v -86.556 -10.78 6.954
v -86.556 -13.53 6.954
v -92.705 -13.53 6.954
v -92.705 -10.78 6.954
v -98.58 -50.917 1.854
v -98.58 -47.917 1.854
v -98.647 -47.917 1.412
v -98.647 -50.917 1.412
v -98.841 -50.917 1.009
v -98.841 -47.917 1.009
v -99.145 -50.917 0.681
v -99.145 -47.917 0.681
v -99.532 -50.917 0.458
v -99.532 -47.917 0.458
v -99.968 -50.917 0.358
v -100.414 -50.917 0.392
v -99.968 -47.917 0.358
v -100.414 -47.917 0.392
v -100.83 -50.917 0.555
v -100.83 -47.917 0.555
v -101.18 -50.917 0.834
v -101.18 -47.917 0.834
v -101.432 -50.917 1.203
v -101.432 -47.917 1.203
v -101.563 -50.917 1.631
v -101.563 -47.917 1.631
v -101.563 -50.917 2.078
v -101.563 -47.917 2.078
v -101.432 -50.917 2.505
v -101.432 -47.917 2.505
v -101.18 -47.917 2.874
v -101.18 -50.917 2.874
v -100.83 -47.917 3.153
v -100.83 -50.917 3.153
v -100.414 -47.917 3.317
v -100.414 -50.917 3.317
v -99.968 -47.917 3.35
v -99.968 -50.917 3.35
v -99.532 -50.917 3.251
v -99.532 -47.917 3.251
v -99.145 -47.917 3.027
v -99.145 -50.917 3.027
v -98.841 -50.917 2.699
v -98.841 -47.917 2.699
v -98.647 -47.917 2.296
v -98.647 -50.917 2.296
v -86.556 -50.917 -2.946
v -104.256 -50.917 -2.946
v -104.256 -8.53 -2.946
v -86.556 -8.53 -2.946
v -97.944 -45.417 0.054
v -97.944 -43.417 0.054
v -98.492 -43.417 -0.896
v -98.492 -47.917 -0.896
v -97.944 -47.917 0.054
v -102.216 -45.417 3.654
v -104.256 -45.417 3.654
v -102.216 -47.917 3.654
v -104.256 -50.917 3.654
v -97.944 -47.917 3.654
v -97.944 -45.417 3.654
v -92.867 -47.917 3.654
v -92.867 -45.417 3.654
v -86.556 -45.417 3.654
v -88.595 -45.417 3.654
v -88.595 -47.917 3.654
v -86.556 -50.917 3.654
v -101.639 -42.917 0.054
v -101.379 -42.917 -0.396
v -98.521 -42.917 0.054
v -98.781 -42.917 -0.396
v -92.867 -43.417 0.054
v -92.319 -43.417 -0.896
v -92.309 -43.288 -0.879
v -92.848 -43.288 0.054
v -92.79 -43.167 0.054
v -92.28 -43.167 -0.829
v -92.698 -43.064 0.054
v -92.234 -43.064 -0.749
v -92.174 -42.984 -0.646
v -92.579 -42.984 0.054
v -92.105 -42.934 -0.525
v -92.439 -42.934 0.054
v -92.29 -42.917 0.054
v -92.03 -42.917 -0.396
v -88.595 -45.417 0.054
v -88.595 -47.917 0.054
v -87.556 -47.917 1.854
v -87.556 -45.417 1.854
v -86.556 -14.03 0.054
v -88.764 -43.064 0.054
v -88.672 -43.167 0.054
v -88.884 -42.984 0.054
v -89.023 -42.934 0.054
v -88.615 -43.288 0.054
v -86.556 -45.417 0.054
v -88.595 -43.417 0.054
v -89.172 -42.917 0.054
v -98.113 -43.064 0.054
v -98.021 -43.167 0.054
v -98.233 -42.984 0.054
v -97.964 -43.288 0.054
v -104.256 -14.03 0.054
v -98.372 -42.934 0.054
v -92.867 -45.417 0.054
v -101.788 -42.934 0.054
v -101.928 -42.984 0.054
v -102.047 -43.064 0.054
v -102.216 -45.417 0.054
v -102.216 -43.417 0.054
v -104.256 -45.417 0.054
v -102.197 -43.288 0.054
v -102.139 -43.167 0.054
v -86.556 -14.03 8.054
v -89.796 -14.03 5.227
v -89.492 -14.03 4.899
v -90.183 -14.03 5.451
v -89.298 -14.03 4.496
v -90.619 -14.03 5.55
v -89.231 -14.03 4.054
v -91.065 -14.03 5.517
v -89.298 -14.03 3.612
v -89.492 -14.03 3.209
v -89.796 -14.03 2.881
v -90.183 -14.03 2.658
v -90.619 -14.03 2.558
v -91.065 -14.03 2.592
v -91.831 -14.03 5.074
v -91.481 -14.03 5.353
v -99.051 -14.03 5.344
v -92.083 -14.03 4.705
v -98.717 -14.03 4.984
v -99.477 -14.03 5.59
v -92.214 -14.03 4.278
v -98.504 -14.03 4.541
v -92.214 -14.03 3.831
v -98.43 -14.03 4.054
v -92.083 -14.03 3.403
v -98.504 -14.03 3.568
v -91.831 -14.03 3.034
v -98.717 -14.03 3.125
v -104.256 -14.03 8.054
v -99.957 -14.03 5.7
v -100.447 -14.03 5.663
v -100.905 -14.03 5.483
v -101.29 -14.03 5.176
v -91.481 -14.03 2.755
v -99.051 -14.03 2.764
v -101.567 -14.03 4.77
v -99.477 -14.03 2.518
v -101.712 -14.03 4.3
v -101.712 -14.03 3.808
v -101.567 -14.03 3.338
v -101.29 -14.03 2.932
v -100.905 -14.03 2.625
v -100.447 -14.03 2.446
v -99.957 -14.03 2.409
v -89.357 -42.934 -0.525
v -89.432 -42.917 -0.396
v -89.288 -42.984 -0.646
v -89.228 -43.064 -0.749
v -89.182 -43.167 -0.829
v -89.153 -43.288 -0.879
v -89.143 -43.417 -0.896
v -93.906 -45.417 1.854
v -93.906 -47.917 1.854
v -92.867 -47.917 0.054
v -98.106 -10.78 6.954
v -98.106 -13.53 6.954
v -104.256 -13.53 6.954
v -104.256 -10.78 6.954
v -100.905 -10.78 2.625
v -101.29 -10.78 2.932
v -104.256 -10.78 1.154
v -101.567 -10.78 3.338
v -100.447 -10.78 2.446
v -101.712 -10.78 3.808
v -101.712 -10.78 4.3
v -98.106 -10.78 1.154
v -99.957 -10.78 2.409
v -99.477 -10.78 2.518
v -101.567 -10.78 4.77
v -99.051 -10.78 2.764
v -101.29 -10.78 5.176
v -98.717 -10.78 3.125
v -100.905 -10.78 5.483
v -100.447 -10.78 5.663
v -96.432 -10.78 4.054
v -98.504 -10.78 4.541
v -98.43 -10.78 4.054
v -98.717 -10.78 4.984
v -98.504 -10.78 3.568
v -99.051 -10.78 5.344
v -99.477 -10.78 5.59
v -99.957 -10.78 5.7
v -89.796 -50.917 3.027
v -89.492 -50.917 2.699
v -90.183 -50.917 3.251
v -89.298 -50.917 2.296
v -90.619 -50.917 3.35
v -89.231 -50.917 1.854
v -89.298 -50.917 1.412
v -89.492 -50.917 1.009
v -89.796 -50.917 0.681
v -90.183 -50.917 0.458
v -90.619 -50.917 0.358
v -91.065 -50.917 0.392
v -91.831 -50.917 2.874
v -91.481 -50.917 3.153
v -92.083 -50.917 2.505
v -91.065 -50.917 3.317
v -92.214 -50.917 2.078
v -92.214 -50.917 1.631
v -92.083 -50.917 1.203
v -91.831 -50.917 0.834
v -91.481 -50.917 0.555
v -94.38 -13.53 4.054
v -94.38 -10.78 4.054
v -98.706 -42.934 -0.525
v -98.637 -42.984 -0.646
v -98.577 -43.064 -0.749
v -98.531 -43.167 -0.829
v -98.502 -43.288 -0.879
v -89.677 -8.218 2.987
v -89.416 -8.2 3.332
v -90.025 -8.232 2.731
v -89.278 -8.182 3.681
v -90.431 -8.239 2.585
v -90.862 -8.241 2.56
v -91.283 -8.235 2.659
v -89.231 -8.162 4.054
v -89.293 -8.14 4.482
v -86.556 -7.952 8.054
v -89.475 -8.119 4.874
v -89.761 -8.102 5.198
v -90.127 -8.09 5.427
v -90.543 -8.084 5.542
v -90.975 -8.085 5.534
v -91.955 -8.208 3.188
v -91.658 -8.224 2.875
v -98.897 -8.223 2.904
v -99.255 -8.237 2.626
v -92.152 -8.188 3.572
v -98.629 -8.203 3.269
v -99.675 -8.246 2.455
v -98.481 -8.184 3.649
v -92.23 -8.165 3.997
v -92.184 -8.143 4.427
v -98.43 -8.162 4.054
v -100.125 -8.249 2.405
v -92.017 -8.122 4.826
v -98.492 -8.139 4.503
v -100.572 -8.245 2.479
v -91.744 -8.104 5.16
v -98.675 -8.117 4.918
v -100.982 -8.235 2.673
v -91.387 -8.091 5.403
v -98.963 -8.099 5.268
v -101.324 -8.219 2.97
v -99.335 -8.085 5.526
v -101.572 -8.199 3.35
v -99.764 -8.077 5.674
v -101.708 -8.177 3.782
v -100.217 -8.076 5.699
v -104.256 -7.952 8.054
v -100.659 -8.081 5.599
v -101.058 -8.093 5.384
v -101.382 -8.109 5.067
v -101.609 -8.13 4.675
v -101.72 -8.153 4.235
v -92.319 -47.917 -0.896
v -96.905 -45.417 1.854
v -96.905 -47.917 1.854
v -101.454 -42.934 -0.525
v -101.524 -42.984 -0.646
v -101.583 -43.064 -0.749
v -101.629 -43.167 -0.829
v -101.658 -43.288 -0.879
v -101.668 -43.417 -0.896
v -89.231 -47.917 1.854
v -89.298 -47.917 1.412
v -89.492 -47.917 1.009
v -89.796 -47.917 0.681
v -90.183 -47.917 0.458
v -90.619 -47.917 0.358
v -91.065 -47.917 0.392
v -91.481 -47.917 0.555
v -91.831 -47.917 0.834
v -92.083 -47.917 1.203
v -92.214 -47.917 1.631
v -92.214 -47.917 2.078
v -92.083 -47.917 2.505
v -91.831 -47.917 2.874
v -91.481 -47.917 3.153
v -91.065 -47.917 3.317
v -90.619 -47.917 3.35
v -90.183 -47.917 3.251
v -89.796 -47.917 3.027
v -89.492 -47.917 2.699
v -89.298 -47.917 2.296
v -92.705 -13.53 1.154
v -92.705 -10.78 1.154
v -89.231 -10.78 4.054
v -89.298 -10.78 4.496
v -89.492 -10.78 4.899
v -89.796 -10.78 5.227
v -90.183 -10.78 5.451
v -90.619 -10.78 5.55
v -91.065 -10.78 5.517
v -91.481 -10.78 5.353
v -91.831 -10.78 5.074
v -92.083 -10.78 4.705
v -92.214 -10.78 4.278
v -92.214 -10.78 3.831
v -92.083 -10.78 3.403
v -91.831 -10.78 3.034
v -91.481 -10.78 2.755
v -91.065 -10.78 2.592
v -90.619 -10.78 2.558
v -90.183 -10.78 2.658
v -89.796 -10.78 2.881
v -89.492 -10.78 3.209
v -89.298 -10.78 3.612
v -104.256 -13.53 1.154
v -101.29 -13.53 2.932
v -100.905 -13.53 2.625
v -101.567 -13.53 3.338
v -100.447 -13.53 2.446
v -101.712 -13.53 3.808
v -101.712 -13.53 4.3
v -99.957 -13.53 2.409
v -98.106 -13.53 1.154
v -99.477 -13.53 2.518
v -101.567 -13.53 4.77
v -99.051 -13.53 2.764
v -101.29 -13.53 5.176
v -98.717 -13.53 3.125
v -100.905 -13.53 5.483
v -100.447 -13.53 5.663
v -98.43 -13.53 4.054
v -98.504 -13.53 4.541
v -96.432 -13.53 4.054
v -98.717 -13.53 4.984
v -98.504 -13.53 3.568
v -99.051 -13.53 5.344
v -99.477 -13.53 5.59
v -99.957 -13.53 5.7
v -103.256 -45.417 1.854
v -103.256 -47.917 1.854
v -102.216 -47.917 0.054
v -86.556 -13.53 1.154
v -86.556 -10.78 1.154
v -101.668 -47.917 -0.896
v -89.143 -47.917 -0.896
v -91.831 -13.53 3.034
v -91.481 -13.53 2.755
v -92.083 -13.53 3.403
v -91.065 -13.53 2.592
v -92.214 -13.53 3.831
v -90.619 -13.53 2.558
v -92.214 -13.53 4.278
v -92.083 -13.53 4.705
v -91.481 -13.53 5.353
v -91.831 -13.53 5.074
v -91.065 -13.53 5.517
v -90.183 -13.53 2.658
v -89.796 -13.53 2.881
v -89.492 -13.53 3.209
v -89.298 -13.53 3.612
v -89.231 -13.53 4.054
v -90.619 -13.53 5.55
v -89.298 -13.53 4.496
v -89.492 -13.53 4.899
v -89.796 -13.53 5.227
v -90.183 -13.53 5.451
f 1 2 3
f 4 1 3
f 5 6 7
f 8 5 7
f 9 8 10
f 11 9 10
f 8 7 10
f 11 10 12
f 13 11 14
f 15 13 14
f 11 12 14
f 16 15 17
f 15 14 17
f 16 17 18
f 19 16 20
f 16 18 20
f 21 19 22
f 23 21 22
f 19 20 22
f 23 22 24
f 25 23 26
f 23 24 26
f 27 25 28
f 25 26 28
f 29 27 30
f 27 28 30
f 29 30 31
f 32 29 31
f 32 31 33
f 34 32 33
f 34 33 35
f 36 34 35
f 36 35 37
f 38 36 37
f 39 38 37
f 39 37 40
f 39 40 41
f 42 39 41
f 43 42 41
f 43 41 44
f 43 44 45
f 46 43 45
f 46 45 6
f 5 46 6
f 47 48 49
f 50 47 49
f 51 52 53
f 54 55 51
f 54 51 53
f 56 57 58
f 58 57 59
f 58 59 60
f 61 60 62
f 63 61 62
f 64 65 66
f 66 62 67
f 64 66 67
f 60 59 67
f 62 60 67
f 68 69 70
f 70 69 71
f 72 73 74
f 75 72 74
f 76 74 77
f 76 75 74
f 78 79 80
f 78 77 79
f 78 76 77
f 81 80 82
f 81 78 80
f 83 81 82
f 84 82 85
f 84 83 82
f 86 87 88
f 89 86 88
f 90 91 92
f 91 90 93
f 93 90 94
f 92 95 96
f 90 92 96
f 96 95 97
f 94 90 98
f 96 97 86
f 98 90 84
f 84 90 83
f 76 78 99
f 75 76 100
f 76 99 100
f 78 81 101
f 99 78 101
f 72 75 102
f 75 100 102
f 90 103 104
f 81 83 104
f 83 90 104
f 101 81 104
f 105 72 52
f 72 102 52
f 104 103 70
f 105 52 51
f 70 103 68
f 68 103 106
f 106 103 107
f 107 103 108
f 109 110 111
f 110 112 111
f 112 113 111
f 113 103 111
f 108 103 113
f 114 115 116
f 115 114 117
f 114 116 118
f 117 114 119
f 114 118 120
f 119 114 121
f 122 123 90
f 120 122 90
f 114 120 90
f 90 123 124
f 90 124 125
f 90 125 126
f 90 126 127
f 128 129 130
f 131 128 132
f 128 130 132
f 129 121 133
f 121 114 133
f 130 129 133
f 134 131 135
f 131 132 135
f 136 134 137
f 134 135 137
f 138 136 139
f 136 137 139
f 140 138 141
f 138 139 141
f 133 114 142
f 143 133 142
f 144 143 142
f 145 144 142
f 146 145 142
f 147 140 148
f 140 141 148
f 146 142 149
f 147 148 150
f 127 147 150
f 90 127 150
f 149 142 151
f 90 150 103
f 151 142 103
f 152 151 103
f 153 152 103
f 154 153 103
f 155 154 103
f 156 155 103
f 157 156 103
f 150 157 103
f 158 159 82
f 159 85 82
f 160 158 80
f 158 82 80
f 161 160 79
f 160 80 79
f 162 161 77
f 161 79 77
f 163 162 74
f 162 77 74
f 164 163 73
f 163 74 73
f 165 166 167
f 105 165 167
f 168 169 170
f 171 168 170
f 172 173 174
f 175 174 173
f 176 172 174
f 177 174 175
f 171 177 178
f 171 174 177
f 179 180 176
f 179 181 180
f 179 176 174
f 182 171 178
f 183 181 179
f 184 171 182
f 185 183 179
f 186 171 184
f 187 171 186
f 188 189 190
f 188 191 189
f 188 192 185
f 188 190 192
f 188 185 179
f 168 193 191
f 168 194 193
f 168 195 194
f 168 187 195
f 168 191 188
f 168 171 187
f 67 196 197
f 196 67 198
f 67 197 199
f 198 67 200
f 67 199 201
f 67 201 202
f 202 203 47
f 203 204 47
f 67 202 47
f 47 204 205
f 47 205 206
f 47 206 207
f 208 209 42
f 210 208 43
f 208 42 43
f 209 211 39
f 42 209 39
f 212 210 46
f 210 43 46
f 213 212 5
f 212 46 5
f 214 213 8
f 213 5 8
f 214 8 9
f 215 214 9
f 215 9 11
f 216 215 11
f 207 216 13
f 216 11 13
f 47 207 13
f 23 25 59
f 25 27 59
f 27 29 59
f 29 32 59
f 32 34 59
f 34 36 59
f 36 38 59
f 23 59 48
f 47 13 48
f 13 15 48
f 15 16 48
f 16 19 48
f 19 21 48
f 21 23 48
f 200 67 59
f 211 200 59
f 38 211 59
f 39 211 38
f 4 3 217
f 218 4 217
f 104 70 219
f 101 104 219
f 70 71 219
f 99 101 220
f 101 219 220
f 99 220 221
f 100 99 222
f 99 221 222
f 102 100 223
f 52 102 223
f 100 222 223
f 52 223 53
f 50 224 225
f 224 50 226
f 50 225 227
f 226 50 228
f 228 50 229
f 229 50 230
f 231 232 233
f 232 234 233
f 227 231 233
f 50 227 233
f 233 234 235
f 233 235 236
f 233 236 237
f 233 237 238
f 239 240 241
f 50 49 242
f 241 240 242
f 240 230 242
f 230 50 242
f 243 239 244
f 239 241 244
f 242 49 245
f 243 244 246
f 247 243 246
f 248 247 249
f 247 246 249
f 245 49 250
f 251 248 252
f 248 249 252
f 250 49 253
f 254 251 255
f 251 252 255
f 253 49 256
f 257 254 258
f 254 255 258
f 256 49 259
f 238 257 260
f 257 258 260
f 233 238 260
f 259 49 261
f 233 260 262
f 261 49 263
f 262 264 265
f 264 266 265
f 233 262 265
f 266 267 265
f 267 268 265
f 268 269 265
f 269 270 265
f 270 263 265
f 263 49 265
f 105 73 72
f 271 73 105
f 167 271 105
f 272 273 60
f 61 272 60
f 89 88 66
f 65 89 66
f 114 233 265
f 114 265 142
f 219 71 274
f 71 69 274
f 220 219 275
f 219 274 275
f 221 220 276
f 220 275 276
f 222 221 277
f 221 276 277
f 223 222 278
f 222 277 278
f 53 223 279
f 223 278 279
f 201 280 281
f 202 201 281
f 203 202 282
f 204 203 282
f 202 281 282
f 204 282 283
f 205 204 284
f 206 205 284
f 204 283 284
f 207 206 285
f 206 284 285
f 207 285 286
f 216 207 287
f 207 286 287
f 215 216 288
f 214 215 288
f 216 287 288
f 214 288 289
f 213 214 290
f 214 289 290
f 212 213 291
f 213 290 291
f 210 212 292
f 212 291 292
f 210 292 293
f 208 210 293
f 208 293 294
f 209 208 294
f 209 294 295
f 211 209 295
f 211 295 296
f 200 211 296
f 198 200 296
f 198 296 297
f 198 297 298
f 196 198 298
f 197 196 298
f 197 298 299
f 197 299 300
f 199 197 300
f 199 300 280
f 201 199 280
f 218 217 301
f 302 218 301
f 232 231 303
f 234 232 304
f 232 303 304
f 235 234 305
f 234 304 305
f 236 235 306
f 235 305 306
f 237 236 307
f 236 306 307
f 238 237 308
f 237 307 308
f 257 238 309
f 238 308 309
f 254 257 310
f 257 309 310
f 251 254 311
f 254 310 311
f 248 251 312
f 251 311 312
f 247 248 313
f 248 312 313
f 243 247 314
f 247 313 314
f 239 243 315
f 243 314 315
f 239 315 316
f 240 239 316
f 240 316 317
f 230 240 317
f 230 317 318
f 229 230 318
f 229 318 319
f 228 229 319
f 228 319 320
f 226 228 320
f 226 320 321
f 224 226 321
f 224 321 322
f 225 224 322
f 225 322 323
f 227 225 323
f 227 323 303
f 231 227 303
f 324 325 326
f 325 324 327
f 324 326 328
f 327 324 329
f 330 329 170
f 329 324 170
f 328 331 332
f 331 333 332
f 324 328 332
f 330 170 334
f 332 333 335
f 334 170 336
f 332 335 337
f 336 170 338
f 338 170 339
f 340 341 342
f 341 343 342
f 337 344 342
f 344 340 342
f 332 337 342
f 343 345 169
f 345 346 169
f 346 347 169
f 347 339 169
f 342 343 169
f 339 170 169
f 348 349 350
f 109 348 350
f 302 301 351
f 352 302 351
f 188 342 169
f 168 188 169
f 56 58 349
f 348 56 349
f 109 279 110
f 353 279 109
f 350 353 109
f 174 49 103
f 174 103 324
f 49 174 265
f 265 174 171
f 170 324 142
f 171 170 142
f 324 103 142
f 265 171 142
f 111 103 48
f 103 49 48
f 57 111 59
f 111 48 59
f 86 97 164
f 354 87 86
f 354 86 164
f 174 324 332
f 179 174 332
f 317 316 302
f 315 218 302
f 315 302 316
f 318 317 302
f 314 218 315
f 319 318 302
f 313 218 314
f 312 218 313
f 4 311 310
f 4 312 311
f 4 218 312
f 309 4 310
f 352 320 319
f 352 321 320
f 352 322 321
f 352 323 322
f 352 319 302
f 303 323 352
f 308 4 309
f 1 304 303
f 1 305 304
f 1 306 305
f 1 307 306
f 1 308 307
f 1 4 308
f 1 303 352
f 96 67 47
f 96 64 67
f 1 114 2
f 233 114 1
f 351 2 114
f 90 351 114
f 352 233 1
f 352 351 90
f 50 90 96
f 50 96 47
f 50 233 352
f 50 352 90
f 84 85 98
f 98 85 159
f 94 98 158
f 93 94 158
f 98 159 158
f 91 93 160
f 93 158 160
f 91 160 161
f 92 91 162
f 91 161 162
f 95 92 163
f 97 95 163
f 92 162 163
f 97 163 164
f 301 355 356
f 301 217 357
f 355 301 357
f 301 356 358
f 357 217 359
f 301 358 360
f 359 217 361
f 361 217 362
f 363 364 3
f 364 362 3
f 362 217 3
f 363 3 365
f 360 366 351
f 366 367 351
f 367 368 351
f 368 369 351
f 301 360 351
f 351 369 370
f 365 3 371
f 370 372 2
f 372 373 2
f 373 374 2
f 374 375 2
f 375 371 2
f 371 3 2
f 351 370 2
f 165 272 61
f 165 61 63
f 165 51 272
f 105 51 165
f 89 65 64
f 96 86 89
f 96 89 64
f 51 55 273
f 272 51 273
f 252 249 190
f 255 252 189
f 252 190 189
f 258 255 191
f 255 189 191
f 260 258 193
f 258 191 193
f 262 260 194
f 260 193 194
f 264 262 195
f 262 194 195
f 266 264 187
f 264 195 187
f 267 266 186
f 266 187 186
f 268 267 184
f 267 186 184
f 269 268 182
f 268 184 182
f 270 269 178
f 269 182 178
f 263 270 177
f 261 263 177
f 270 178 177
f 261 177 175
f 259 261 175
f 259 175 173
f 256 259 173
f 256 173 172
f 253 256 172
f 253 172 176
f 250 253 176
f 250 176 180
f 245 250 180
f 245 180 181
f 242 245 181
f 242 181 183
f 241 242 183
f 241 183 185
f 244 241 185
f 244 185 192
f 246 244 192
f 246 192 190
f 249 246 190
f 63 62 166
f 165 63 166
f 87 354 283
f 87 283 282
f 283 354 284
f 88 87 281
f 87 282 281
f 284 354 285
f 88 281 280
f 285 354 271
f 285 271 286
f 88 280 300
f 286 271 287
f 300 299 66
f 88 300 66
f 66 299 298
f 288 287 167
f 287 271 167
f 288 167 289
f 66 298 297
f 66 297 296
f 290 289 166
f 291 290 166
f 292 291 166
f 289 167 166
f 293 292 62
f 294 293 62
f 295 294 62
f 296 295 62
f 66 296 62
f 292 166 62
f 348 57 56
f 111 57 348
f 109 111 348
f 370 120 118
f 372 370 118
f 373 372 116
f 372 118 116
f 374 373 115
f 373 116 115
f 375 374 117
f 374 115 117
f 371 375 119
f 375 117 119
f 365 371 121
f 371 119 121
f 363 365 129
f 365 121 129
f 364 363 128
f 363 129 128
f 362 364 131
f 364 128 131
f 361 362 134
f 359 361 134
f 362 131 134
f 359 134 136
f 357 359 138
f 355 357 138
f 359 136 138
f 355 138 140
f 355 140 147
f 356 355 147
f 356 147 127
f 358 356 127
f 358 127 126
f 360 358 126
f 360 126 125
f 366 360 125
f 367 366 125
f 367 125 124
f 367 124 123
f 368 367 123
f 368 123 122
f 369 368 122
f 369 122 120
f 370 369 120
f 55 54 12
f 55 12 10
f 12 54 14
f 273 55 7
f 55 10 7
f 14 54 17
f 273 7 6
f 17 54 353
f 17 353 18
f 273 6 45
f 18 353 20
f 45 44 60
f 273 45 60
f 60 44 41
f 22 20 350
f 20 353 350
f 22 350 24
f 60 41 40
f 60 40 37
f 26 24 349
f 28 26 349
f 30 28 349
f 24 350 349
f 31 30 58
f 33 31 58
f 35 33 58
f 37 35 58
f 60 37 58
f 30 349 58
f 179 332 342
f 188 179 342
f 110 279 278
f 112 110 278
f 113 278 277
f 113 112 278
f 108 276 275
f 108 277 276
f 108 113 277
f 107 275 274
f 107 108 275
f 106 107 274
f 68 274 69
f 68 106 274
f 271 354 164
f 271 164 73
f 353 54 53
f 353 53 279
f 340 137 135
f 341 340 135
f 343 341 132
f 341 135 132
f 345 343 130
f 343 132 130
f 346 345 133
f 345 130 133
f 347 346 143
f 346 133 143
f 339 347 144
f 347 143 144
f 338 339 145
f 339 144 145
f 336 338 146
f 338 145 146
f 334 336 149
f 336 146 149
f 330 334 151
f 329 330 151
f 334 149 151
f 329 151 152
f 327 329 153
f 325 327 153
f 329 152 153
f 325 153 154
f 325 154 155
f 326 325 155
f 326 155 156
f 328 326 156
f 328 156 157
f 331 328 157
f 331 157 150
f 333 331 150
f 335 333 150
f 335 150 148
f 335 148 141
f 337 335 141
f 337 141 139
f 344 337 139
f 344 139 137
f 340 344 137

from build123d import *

# Parameters (mm, degrees)
BOSS_EXTRUDE1_START = -0.4
BOSS_EXTRUDE1_DEPTH = 17.7
CUT_EXTRUDE1_REACH  = 5
SKETCH3_R           = 1.5
BOSS_EXTRUDE2_DEPTH = 2.5
SKETCH3_3_R         = 1.5
CUT_EXTRUDE2_DEPTH  = 5
FILLET2_R           = 0.5
SKETCH4_R           = 1.5
SKETCH4_R_2         = 1.65
CUT_EXTRUDE3_DEPTH  = 7.077263094
CUT_EXTRUDE4_START  = -0.5
SKETCH5_R           = 1.65
SKETCH5_R_2         = 1.5
CUT_EXTRUDE4_DEPTH  = 2.75


with BuildPart() as part:
    # Sketch2 → Boss-Extrude1 (new body)
    with BuildSketch(Plane.ZY.offset(104.655623537).offset(BOSS_EXTRUDE1_START)):
        Polygon((3.654210553, -50.917330539), (-2.945789447, -50.917330539), (-2.945789447, -8.529639022), (8.054210553, -7.952375928), (8.054210553, -14.029639022), (0.054210553, -14.029639022), (0.054210553, -47.917330539), (3.654210553, -47.917330539), align=None)
    extrude(amount=-BOSS_EXTRUDE1_DEPTH)

    # Sketch3 → Cut-Extrude1 (cut, up to next)
    with BuildSketch(Plane(origin=(0, -47.917330539, 0), x_dir=(1, 0, 0), z_dir=(0, 1, 0)), mode=Mode.PRIVATE) as cut_extrude1_sk1:
        with Locations((-90.731050017, -1.854210553)):
            Circle(SKETCH3_R)
    cut_extrude1_tool1 = extrude(cut_extrude1_sk1.sketch, amount=-CUT_EXTRUDE1_REACH, mode=Mode.PRIVATE) & part.part
    add(cut_extrude1_tool1.solids().sort_by_distance((-90.73105, -47.917331, 1.854211))[0], mode=Mode.SUBTRACT)
    # Sketch3 → Cut-Extrude1 (cut, up to next)
    with BuildSketch(Plane(origin=(0, -47.917330539, 0), x_dir=(1, 0, 0), z_dir=(0, 1, 0)), mode=Mode.PRIVATE) as cut_extrude1_sk2:
        with Locations((-100.080197056, -1.854210553)):
            Circle(SKETCH3_R)
    cut_extrude1_tool2 = extrude(cut_extrude1_sk2.sketch, amount=-CUT_EXTRUDE1_REACH, mode=Mode.PRIVATE) & part.part
    add(cut_extrude1_tool2.solids().sort_by_distance((-100.080197, -47.917331, 1.854211))[0], mode=Mode.SUBTRACT)

    # Sketch3_4 → Boss-Extrude2 (add)
    with BuildSketch(Plane(origin=(0, -47.917330539, 0), x_dir=(1, 0, 0), z_dir=(0, 1, 0))):
        Polygon((-102.216393052, -3.654210553), (-103.255623537, -1.854210553), (-102.216393052, -0.054210553), (-104.255623537, -0.054210553), (-104.255623537, -3.654210553), align=None)
        Polygon((-96.904770576, -1.854210553), (-97.94400106, -3.654210553), (-92.867246013, -3.654210553), (-93.906476498, -1.854210553), (-92.867246013, -0.054210553), (-97.94400106, -0.054210553), align=None)
        Polygon((-87.555623537, -1.854210553), (-88.594854021, -3.654210553), (-86.555623537, -3.654210553), (-86.555623537, -0.054210553), (-88.594854021, -0.054210553), align=None)
    extrude(amount=BOSS_EXTRUDE2_DEPTH)

    # Sketch3_3 → Cut-Extrude2 (cut)
    with BuildSketch(Plane(origin=(0, -47.917330539, 0), x_dir=(1, 0, 0), z_dir=(0, 1, 0))):
        Polygon((-103.255623537, -1.854210553), (-101.667910296, -4.604210553), (-98.492483816, -4.604210553), (-96.904770576, -1.854210553), (-98.492483816, 0.895789447), (-101.667910296, 0.895789447), align=None)
        with Locations((-100.080197056, -1.854210553)):
            Circle(SKETCH3_3_R, mode=Mode.SUBTRACT)
        Polygon((-87.555623537, -1.854210553), (-89.143336777, 0.895789447), (-92.318763257, 0.895789447), (-93.906476498, -1.854210553), (-92.318763257, -4.604210553), (-89.143336777, -4.604210553), align=None)
        with Locations((-90.731050017, -1.854210553)):
            Circle(SKETCH3_3_R, mode=Mode.SUBTRACT)
    extrude(amount=CUT_EXTRUDE2_DEPTH, mode=Mode.SUBTRACT)

    # Fillet2
    fillet2_edges = [part.edges().sort_by_distance(p)[0] for p in [
        (-98.218242438, -42.917330539, -0.420789447),
        (-100.080197056, -42.917330539, -0.895789447),
        (-101.942151674, -42.917330539, -0.420789447),
        (-88.869095399, -42.917330539, -0.420789447),
        (-90.731050017, -42.917330539, -0.895789447),
        (-92.593004635, -42.917330539, -0.420789447),
    ]]
    fillet(fillet2_edges, radius=FILLET2_R)

    # Sketch4 → Cut-Extrude3 (cut, through all)
    with BuildSketch(Plane.XZ.offset(14.029639022)):
        with Locations((-90.731050017, 4.054210553)):
            Circle(SKETCH4_R)
        with Locations((-100.080197056, 4.054210553)):
            Circle(SKETCH4_R_2)
    extrude(amount=-CUT_EXTRUDE3_DEPTH, mode=Mode.SUBTRACT)

    # Sketch5 → Cut-Extrude4 (cut)
    with BuildSketch(Plane.XZ.offset(14.029639022).offset(CUT_EXTRUDE4_START)):
        Polygon((-103.128828617, 4.054210553), (-101.454512837, 6.954210553), (-104.255623537, 6.954210553), (-104.255623537, 1.154210553), (-101.454512837, 1.154210553), align=None)
        Polygon((-101.454512837, 1.154210553), (-98.105881275, 1.154210553), (-96.431565495, 4.054210553), (-98.105881275, 6.954210553), (-101.454512837, 6.954210553), (-103.128828617, 4.054210553), align=None)
        with Locations((-100.080197056, 4.054210553)):
            Circle(SKETCH5_R, mode=Mode.SUBTRACT)
        Polygon((-92.705365798, 1.154210553), (-89.356734237, 1.154210553), (-87.682418456, 4.054210553), (-89.356734237, 6.954210553), (-92.705365798, 6.954210553), (-94.379681578, 4.054210553), align=None)
        with Locations((-90.731050017, 4.054210553)):
            Circle(SKETCH5_R_2, mode=Mode.SUBTRACT)
        Polygon((-89.356734237, 6.954210553), (-87.682418456, 4.054210553), (-89.356734237, 1.154210553), (-86.555623537, 1.154210553), (-86.555623537, 6.954210553), align=None)
    extrude(amount=-CUT_EXTRUDE4_DEPTH, mode=Mode.SUBTRACT)


solid = part.part
